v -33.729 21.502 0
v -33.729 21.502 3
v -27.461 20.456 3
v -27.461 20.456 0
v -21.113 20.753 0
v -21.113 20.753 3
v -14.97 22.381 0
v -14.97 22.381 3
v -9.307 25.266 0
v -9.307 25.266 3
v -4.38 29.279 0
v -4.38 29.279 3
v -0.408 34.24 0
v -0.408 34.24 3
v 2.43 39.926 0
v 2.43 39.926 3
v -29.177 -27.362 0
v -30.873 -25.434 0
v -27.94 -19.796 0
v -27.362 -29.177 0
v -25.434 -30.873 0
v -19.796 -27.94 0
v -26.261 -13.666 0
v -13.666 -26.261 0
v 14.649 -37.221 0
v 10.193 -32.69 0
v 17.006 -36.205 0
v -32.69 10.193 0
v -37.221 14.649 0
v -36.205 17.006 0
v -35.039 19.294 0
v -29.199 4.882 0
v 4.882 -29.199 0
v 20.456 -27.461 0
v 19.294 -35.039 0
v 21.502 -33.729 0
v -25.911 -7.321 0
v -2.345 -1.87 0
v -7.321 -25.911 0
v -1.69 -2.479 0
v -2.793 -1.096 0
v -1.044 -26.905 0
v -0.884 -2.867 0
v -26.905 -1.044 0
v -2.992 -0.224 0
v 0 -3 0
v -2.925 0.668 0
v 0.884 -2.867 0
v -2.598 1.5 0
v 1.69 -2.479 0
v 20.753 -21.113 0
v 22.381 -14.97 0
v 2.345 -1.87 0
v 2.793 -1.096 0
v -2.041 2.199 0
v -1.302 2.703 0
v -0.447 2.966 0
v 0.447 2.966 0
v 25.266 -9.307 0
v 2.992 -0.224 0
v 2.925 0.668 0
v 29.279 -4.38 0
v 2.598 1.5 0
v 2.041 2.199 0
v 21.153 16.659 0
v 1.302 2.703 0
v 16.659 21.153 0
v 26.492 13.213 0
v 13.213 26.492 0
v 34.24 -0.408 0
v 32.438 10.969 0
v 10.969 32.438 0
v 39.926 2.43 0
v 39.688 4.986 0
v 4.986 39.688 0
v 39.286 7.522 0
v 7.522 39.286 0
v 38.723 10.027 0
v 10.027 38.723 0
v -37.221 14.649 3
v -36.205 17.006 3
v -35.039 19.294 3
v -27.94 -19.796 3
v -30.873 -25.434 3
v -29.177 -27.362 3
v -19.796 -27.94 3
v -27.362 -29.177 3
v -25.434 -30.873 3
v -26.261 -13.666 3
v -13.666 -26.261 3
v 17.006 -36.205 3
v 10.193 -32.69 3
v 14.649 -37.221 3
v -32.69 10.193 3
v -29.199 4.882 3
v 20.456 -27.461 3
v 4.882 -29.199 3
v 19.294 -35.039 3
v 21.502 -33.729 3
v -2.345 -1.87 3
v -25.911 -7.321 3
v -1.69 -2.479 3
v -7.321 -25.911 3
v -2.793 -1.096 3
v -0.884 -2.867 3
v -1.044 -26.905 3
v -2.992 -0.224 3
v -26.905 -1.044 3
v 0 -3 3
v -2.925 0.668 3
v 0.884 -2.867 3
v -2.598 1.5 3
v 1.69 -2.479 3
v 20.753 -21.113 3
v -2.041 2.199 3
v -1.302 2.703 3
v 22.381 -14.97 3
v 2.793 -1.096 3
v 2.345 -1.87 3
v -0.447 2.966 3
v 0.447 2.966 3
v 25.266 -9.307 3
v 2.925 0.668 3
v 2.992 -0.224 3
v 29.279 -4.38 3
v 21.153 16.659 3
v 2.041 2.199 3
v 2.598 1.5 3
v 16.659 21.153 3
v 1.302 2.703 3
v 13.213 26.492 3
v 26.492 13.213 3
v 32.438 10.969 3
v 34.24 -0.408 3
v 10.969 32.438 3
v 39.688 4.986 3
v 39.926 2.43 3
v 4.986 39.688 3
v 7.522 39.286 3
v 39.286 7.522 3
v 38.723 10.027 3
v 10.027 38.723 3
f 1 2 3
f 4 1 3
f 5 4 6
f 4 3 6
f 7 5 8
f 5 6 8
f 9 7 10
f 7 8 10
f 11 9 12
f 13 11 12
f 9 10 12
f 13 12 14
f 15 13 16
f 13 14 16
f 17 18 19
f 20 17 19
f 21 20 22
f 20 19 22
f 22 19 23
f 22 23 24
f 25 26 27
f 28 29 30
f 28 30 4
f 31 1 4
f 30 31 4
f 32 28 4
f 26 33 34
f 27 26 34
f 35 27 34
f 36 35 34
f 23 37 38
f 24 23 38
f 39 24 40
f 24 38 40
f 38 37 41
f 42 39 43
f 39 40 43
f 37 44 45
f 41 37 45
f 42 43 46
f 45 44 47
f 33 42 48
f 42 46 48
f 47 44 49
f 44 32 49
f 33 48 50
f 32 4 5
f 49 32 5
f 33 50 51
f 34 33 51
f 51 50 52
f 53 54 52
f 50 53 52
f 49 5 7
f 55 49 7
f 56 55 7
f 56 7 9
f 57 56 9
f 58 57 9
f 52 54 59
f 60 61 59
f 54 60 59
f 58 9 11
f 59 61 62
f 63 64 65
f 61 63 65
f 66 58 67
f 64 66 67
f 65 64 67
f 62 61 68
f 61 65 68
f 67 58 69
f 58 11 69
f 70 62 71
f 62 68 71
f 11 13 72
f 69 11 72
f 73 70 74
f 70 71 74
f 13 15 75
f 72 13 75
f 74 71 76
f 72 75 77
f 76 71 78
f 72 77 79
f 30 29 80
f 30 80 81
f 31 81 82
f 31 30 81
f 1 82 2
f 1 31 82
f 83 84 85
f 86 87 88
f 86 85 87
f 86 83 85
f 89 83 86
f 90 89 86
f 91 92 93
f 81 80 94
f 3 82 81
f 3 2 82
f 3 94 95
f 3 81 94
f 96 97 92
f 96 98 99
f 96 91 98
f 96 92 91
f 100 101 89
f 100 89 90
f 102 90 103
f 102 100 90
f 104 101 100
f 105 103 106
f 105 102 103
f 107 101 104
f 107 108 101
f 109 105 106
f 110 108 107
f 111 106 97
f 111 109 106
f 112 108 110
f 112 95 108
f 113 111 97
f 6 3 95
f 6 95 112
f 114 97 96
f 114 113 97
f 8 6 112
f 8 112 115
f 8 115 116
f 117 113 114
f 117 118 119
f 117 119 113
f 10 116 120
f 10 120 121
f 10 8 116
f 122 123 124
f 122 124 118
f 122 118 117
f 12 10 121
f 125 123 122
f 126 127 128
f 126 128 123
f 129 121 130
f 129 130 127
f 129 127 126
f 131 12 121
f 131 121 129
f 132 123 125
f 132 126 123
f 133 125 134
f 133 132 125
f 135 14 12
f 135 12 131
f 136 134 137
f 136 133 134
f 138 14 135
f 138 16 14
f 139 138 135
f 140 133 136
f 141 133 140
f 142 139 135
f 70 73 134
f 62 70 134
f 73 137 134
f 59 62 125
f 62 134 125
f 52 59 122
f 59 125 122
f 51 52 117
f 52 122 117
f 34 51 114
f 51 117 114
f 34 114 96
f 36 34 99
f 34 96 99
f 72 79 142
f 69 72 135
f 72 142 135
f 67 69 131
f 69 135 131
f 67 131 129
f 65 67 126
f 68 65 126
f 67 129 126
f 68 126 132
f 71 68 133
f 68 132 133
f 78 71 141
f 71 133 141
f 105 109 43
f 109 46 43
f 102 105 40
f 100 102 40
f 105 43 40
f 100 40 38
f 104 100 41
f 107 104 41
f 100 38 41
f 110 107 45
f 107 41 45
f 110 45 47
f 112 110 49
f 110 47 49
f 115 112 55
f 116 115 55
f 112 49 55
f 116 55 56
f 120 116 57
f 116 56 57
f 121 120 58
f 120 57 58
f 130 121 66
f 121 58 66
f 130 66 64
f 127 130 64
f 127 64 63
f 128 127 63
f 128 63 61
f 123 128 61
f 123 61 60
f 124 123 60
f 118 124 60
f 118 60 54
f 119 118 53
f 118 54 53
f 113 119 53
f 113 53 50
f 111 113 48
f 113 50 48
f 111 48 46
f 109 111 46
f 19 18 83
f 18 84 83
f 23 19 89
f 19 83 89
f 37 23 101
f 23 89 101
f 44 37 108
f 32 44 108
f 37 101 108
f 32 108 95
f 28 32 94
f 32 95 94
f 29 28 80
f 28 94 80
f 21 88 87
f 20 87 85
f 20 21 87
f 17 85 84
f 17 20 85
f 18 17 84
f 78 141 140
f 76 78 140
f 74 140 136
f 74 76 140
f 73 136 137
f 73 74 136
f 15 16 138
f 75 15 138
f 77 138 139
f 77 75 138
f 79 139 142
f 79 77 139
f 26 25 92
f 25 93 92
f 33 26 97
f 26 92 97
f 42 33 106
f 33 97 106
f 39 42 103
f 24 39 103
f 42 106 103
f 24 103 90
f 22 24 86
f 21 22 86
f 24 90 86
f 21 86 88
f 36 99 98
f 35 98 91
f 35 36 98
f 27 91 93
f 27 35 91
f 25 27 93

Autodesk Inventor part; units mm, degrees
ref_plane "YZ Plane" through (0, 0, 0) normal (1, 0, 0) x (0, 1, 0)
ref_plane "XZ Plane" through (0, 0, 0) normal (0, 1, 0) x (-1, 0, 0)
ref_plane "XY Plane" through (0, 0, 0) normal (0, 0, 1) x (1, 0, 0)
sketch "Sketch1" plane through (0, 0, 0) normal (0, 0, 1) x (1, 0, 0)
  circle A0 centre (0, 0) radius 40
  dimension "d0" = 80
extrude "Extrusion1" add sketch "Sketch1" along normal blind 3
sketch "Sketch2" plane through (0, 0, 3) normal (0, 0, 1) x (1, 0, 0)
  circle A0 centre (0, 0) radius 40 projected
  circle A1 centre (40, 40) radius 30
  dimension "d6" = 60
  dimension "d7" = 40
  dimension "d8" = 40
extrude "Extrusion2" cut sketch "Sketch2" against normal through all contours A1 A0 | A0 A1 picked at (25.0118, 25.0118) picked at (39.5025, 38.7873)
pattern_circular "Circular Pattern1" count 5 over 360 about axis through (0, 0, -10) along (0, 0, 1) of "Extrusion2"
sketch "Sketch3" plane through (0, 0, 3) normal (0, 0, 1) x (1, 0, 0)
  point P0 (0, 0)
  point P1 (0, 0)
hole "Hole1" at (0, 0, 3) direction (0, 0, -1) diameter 6 end through all
equation "\"d8\" = d7"
properties part number "Pancake_Star" material "PC/ABS Plastic"
